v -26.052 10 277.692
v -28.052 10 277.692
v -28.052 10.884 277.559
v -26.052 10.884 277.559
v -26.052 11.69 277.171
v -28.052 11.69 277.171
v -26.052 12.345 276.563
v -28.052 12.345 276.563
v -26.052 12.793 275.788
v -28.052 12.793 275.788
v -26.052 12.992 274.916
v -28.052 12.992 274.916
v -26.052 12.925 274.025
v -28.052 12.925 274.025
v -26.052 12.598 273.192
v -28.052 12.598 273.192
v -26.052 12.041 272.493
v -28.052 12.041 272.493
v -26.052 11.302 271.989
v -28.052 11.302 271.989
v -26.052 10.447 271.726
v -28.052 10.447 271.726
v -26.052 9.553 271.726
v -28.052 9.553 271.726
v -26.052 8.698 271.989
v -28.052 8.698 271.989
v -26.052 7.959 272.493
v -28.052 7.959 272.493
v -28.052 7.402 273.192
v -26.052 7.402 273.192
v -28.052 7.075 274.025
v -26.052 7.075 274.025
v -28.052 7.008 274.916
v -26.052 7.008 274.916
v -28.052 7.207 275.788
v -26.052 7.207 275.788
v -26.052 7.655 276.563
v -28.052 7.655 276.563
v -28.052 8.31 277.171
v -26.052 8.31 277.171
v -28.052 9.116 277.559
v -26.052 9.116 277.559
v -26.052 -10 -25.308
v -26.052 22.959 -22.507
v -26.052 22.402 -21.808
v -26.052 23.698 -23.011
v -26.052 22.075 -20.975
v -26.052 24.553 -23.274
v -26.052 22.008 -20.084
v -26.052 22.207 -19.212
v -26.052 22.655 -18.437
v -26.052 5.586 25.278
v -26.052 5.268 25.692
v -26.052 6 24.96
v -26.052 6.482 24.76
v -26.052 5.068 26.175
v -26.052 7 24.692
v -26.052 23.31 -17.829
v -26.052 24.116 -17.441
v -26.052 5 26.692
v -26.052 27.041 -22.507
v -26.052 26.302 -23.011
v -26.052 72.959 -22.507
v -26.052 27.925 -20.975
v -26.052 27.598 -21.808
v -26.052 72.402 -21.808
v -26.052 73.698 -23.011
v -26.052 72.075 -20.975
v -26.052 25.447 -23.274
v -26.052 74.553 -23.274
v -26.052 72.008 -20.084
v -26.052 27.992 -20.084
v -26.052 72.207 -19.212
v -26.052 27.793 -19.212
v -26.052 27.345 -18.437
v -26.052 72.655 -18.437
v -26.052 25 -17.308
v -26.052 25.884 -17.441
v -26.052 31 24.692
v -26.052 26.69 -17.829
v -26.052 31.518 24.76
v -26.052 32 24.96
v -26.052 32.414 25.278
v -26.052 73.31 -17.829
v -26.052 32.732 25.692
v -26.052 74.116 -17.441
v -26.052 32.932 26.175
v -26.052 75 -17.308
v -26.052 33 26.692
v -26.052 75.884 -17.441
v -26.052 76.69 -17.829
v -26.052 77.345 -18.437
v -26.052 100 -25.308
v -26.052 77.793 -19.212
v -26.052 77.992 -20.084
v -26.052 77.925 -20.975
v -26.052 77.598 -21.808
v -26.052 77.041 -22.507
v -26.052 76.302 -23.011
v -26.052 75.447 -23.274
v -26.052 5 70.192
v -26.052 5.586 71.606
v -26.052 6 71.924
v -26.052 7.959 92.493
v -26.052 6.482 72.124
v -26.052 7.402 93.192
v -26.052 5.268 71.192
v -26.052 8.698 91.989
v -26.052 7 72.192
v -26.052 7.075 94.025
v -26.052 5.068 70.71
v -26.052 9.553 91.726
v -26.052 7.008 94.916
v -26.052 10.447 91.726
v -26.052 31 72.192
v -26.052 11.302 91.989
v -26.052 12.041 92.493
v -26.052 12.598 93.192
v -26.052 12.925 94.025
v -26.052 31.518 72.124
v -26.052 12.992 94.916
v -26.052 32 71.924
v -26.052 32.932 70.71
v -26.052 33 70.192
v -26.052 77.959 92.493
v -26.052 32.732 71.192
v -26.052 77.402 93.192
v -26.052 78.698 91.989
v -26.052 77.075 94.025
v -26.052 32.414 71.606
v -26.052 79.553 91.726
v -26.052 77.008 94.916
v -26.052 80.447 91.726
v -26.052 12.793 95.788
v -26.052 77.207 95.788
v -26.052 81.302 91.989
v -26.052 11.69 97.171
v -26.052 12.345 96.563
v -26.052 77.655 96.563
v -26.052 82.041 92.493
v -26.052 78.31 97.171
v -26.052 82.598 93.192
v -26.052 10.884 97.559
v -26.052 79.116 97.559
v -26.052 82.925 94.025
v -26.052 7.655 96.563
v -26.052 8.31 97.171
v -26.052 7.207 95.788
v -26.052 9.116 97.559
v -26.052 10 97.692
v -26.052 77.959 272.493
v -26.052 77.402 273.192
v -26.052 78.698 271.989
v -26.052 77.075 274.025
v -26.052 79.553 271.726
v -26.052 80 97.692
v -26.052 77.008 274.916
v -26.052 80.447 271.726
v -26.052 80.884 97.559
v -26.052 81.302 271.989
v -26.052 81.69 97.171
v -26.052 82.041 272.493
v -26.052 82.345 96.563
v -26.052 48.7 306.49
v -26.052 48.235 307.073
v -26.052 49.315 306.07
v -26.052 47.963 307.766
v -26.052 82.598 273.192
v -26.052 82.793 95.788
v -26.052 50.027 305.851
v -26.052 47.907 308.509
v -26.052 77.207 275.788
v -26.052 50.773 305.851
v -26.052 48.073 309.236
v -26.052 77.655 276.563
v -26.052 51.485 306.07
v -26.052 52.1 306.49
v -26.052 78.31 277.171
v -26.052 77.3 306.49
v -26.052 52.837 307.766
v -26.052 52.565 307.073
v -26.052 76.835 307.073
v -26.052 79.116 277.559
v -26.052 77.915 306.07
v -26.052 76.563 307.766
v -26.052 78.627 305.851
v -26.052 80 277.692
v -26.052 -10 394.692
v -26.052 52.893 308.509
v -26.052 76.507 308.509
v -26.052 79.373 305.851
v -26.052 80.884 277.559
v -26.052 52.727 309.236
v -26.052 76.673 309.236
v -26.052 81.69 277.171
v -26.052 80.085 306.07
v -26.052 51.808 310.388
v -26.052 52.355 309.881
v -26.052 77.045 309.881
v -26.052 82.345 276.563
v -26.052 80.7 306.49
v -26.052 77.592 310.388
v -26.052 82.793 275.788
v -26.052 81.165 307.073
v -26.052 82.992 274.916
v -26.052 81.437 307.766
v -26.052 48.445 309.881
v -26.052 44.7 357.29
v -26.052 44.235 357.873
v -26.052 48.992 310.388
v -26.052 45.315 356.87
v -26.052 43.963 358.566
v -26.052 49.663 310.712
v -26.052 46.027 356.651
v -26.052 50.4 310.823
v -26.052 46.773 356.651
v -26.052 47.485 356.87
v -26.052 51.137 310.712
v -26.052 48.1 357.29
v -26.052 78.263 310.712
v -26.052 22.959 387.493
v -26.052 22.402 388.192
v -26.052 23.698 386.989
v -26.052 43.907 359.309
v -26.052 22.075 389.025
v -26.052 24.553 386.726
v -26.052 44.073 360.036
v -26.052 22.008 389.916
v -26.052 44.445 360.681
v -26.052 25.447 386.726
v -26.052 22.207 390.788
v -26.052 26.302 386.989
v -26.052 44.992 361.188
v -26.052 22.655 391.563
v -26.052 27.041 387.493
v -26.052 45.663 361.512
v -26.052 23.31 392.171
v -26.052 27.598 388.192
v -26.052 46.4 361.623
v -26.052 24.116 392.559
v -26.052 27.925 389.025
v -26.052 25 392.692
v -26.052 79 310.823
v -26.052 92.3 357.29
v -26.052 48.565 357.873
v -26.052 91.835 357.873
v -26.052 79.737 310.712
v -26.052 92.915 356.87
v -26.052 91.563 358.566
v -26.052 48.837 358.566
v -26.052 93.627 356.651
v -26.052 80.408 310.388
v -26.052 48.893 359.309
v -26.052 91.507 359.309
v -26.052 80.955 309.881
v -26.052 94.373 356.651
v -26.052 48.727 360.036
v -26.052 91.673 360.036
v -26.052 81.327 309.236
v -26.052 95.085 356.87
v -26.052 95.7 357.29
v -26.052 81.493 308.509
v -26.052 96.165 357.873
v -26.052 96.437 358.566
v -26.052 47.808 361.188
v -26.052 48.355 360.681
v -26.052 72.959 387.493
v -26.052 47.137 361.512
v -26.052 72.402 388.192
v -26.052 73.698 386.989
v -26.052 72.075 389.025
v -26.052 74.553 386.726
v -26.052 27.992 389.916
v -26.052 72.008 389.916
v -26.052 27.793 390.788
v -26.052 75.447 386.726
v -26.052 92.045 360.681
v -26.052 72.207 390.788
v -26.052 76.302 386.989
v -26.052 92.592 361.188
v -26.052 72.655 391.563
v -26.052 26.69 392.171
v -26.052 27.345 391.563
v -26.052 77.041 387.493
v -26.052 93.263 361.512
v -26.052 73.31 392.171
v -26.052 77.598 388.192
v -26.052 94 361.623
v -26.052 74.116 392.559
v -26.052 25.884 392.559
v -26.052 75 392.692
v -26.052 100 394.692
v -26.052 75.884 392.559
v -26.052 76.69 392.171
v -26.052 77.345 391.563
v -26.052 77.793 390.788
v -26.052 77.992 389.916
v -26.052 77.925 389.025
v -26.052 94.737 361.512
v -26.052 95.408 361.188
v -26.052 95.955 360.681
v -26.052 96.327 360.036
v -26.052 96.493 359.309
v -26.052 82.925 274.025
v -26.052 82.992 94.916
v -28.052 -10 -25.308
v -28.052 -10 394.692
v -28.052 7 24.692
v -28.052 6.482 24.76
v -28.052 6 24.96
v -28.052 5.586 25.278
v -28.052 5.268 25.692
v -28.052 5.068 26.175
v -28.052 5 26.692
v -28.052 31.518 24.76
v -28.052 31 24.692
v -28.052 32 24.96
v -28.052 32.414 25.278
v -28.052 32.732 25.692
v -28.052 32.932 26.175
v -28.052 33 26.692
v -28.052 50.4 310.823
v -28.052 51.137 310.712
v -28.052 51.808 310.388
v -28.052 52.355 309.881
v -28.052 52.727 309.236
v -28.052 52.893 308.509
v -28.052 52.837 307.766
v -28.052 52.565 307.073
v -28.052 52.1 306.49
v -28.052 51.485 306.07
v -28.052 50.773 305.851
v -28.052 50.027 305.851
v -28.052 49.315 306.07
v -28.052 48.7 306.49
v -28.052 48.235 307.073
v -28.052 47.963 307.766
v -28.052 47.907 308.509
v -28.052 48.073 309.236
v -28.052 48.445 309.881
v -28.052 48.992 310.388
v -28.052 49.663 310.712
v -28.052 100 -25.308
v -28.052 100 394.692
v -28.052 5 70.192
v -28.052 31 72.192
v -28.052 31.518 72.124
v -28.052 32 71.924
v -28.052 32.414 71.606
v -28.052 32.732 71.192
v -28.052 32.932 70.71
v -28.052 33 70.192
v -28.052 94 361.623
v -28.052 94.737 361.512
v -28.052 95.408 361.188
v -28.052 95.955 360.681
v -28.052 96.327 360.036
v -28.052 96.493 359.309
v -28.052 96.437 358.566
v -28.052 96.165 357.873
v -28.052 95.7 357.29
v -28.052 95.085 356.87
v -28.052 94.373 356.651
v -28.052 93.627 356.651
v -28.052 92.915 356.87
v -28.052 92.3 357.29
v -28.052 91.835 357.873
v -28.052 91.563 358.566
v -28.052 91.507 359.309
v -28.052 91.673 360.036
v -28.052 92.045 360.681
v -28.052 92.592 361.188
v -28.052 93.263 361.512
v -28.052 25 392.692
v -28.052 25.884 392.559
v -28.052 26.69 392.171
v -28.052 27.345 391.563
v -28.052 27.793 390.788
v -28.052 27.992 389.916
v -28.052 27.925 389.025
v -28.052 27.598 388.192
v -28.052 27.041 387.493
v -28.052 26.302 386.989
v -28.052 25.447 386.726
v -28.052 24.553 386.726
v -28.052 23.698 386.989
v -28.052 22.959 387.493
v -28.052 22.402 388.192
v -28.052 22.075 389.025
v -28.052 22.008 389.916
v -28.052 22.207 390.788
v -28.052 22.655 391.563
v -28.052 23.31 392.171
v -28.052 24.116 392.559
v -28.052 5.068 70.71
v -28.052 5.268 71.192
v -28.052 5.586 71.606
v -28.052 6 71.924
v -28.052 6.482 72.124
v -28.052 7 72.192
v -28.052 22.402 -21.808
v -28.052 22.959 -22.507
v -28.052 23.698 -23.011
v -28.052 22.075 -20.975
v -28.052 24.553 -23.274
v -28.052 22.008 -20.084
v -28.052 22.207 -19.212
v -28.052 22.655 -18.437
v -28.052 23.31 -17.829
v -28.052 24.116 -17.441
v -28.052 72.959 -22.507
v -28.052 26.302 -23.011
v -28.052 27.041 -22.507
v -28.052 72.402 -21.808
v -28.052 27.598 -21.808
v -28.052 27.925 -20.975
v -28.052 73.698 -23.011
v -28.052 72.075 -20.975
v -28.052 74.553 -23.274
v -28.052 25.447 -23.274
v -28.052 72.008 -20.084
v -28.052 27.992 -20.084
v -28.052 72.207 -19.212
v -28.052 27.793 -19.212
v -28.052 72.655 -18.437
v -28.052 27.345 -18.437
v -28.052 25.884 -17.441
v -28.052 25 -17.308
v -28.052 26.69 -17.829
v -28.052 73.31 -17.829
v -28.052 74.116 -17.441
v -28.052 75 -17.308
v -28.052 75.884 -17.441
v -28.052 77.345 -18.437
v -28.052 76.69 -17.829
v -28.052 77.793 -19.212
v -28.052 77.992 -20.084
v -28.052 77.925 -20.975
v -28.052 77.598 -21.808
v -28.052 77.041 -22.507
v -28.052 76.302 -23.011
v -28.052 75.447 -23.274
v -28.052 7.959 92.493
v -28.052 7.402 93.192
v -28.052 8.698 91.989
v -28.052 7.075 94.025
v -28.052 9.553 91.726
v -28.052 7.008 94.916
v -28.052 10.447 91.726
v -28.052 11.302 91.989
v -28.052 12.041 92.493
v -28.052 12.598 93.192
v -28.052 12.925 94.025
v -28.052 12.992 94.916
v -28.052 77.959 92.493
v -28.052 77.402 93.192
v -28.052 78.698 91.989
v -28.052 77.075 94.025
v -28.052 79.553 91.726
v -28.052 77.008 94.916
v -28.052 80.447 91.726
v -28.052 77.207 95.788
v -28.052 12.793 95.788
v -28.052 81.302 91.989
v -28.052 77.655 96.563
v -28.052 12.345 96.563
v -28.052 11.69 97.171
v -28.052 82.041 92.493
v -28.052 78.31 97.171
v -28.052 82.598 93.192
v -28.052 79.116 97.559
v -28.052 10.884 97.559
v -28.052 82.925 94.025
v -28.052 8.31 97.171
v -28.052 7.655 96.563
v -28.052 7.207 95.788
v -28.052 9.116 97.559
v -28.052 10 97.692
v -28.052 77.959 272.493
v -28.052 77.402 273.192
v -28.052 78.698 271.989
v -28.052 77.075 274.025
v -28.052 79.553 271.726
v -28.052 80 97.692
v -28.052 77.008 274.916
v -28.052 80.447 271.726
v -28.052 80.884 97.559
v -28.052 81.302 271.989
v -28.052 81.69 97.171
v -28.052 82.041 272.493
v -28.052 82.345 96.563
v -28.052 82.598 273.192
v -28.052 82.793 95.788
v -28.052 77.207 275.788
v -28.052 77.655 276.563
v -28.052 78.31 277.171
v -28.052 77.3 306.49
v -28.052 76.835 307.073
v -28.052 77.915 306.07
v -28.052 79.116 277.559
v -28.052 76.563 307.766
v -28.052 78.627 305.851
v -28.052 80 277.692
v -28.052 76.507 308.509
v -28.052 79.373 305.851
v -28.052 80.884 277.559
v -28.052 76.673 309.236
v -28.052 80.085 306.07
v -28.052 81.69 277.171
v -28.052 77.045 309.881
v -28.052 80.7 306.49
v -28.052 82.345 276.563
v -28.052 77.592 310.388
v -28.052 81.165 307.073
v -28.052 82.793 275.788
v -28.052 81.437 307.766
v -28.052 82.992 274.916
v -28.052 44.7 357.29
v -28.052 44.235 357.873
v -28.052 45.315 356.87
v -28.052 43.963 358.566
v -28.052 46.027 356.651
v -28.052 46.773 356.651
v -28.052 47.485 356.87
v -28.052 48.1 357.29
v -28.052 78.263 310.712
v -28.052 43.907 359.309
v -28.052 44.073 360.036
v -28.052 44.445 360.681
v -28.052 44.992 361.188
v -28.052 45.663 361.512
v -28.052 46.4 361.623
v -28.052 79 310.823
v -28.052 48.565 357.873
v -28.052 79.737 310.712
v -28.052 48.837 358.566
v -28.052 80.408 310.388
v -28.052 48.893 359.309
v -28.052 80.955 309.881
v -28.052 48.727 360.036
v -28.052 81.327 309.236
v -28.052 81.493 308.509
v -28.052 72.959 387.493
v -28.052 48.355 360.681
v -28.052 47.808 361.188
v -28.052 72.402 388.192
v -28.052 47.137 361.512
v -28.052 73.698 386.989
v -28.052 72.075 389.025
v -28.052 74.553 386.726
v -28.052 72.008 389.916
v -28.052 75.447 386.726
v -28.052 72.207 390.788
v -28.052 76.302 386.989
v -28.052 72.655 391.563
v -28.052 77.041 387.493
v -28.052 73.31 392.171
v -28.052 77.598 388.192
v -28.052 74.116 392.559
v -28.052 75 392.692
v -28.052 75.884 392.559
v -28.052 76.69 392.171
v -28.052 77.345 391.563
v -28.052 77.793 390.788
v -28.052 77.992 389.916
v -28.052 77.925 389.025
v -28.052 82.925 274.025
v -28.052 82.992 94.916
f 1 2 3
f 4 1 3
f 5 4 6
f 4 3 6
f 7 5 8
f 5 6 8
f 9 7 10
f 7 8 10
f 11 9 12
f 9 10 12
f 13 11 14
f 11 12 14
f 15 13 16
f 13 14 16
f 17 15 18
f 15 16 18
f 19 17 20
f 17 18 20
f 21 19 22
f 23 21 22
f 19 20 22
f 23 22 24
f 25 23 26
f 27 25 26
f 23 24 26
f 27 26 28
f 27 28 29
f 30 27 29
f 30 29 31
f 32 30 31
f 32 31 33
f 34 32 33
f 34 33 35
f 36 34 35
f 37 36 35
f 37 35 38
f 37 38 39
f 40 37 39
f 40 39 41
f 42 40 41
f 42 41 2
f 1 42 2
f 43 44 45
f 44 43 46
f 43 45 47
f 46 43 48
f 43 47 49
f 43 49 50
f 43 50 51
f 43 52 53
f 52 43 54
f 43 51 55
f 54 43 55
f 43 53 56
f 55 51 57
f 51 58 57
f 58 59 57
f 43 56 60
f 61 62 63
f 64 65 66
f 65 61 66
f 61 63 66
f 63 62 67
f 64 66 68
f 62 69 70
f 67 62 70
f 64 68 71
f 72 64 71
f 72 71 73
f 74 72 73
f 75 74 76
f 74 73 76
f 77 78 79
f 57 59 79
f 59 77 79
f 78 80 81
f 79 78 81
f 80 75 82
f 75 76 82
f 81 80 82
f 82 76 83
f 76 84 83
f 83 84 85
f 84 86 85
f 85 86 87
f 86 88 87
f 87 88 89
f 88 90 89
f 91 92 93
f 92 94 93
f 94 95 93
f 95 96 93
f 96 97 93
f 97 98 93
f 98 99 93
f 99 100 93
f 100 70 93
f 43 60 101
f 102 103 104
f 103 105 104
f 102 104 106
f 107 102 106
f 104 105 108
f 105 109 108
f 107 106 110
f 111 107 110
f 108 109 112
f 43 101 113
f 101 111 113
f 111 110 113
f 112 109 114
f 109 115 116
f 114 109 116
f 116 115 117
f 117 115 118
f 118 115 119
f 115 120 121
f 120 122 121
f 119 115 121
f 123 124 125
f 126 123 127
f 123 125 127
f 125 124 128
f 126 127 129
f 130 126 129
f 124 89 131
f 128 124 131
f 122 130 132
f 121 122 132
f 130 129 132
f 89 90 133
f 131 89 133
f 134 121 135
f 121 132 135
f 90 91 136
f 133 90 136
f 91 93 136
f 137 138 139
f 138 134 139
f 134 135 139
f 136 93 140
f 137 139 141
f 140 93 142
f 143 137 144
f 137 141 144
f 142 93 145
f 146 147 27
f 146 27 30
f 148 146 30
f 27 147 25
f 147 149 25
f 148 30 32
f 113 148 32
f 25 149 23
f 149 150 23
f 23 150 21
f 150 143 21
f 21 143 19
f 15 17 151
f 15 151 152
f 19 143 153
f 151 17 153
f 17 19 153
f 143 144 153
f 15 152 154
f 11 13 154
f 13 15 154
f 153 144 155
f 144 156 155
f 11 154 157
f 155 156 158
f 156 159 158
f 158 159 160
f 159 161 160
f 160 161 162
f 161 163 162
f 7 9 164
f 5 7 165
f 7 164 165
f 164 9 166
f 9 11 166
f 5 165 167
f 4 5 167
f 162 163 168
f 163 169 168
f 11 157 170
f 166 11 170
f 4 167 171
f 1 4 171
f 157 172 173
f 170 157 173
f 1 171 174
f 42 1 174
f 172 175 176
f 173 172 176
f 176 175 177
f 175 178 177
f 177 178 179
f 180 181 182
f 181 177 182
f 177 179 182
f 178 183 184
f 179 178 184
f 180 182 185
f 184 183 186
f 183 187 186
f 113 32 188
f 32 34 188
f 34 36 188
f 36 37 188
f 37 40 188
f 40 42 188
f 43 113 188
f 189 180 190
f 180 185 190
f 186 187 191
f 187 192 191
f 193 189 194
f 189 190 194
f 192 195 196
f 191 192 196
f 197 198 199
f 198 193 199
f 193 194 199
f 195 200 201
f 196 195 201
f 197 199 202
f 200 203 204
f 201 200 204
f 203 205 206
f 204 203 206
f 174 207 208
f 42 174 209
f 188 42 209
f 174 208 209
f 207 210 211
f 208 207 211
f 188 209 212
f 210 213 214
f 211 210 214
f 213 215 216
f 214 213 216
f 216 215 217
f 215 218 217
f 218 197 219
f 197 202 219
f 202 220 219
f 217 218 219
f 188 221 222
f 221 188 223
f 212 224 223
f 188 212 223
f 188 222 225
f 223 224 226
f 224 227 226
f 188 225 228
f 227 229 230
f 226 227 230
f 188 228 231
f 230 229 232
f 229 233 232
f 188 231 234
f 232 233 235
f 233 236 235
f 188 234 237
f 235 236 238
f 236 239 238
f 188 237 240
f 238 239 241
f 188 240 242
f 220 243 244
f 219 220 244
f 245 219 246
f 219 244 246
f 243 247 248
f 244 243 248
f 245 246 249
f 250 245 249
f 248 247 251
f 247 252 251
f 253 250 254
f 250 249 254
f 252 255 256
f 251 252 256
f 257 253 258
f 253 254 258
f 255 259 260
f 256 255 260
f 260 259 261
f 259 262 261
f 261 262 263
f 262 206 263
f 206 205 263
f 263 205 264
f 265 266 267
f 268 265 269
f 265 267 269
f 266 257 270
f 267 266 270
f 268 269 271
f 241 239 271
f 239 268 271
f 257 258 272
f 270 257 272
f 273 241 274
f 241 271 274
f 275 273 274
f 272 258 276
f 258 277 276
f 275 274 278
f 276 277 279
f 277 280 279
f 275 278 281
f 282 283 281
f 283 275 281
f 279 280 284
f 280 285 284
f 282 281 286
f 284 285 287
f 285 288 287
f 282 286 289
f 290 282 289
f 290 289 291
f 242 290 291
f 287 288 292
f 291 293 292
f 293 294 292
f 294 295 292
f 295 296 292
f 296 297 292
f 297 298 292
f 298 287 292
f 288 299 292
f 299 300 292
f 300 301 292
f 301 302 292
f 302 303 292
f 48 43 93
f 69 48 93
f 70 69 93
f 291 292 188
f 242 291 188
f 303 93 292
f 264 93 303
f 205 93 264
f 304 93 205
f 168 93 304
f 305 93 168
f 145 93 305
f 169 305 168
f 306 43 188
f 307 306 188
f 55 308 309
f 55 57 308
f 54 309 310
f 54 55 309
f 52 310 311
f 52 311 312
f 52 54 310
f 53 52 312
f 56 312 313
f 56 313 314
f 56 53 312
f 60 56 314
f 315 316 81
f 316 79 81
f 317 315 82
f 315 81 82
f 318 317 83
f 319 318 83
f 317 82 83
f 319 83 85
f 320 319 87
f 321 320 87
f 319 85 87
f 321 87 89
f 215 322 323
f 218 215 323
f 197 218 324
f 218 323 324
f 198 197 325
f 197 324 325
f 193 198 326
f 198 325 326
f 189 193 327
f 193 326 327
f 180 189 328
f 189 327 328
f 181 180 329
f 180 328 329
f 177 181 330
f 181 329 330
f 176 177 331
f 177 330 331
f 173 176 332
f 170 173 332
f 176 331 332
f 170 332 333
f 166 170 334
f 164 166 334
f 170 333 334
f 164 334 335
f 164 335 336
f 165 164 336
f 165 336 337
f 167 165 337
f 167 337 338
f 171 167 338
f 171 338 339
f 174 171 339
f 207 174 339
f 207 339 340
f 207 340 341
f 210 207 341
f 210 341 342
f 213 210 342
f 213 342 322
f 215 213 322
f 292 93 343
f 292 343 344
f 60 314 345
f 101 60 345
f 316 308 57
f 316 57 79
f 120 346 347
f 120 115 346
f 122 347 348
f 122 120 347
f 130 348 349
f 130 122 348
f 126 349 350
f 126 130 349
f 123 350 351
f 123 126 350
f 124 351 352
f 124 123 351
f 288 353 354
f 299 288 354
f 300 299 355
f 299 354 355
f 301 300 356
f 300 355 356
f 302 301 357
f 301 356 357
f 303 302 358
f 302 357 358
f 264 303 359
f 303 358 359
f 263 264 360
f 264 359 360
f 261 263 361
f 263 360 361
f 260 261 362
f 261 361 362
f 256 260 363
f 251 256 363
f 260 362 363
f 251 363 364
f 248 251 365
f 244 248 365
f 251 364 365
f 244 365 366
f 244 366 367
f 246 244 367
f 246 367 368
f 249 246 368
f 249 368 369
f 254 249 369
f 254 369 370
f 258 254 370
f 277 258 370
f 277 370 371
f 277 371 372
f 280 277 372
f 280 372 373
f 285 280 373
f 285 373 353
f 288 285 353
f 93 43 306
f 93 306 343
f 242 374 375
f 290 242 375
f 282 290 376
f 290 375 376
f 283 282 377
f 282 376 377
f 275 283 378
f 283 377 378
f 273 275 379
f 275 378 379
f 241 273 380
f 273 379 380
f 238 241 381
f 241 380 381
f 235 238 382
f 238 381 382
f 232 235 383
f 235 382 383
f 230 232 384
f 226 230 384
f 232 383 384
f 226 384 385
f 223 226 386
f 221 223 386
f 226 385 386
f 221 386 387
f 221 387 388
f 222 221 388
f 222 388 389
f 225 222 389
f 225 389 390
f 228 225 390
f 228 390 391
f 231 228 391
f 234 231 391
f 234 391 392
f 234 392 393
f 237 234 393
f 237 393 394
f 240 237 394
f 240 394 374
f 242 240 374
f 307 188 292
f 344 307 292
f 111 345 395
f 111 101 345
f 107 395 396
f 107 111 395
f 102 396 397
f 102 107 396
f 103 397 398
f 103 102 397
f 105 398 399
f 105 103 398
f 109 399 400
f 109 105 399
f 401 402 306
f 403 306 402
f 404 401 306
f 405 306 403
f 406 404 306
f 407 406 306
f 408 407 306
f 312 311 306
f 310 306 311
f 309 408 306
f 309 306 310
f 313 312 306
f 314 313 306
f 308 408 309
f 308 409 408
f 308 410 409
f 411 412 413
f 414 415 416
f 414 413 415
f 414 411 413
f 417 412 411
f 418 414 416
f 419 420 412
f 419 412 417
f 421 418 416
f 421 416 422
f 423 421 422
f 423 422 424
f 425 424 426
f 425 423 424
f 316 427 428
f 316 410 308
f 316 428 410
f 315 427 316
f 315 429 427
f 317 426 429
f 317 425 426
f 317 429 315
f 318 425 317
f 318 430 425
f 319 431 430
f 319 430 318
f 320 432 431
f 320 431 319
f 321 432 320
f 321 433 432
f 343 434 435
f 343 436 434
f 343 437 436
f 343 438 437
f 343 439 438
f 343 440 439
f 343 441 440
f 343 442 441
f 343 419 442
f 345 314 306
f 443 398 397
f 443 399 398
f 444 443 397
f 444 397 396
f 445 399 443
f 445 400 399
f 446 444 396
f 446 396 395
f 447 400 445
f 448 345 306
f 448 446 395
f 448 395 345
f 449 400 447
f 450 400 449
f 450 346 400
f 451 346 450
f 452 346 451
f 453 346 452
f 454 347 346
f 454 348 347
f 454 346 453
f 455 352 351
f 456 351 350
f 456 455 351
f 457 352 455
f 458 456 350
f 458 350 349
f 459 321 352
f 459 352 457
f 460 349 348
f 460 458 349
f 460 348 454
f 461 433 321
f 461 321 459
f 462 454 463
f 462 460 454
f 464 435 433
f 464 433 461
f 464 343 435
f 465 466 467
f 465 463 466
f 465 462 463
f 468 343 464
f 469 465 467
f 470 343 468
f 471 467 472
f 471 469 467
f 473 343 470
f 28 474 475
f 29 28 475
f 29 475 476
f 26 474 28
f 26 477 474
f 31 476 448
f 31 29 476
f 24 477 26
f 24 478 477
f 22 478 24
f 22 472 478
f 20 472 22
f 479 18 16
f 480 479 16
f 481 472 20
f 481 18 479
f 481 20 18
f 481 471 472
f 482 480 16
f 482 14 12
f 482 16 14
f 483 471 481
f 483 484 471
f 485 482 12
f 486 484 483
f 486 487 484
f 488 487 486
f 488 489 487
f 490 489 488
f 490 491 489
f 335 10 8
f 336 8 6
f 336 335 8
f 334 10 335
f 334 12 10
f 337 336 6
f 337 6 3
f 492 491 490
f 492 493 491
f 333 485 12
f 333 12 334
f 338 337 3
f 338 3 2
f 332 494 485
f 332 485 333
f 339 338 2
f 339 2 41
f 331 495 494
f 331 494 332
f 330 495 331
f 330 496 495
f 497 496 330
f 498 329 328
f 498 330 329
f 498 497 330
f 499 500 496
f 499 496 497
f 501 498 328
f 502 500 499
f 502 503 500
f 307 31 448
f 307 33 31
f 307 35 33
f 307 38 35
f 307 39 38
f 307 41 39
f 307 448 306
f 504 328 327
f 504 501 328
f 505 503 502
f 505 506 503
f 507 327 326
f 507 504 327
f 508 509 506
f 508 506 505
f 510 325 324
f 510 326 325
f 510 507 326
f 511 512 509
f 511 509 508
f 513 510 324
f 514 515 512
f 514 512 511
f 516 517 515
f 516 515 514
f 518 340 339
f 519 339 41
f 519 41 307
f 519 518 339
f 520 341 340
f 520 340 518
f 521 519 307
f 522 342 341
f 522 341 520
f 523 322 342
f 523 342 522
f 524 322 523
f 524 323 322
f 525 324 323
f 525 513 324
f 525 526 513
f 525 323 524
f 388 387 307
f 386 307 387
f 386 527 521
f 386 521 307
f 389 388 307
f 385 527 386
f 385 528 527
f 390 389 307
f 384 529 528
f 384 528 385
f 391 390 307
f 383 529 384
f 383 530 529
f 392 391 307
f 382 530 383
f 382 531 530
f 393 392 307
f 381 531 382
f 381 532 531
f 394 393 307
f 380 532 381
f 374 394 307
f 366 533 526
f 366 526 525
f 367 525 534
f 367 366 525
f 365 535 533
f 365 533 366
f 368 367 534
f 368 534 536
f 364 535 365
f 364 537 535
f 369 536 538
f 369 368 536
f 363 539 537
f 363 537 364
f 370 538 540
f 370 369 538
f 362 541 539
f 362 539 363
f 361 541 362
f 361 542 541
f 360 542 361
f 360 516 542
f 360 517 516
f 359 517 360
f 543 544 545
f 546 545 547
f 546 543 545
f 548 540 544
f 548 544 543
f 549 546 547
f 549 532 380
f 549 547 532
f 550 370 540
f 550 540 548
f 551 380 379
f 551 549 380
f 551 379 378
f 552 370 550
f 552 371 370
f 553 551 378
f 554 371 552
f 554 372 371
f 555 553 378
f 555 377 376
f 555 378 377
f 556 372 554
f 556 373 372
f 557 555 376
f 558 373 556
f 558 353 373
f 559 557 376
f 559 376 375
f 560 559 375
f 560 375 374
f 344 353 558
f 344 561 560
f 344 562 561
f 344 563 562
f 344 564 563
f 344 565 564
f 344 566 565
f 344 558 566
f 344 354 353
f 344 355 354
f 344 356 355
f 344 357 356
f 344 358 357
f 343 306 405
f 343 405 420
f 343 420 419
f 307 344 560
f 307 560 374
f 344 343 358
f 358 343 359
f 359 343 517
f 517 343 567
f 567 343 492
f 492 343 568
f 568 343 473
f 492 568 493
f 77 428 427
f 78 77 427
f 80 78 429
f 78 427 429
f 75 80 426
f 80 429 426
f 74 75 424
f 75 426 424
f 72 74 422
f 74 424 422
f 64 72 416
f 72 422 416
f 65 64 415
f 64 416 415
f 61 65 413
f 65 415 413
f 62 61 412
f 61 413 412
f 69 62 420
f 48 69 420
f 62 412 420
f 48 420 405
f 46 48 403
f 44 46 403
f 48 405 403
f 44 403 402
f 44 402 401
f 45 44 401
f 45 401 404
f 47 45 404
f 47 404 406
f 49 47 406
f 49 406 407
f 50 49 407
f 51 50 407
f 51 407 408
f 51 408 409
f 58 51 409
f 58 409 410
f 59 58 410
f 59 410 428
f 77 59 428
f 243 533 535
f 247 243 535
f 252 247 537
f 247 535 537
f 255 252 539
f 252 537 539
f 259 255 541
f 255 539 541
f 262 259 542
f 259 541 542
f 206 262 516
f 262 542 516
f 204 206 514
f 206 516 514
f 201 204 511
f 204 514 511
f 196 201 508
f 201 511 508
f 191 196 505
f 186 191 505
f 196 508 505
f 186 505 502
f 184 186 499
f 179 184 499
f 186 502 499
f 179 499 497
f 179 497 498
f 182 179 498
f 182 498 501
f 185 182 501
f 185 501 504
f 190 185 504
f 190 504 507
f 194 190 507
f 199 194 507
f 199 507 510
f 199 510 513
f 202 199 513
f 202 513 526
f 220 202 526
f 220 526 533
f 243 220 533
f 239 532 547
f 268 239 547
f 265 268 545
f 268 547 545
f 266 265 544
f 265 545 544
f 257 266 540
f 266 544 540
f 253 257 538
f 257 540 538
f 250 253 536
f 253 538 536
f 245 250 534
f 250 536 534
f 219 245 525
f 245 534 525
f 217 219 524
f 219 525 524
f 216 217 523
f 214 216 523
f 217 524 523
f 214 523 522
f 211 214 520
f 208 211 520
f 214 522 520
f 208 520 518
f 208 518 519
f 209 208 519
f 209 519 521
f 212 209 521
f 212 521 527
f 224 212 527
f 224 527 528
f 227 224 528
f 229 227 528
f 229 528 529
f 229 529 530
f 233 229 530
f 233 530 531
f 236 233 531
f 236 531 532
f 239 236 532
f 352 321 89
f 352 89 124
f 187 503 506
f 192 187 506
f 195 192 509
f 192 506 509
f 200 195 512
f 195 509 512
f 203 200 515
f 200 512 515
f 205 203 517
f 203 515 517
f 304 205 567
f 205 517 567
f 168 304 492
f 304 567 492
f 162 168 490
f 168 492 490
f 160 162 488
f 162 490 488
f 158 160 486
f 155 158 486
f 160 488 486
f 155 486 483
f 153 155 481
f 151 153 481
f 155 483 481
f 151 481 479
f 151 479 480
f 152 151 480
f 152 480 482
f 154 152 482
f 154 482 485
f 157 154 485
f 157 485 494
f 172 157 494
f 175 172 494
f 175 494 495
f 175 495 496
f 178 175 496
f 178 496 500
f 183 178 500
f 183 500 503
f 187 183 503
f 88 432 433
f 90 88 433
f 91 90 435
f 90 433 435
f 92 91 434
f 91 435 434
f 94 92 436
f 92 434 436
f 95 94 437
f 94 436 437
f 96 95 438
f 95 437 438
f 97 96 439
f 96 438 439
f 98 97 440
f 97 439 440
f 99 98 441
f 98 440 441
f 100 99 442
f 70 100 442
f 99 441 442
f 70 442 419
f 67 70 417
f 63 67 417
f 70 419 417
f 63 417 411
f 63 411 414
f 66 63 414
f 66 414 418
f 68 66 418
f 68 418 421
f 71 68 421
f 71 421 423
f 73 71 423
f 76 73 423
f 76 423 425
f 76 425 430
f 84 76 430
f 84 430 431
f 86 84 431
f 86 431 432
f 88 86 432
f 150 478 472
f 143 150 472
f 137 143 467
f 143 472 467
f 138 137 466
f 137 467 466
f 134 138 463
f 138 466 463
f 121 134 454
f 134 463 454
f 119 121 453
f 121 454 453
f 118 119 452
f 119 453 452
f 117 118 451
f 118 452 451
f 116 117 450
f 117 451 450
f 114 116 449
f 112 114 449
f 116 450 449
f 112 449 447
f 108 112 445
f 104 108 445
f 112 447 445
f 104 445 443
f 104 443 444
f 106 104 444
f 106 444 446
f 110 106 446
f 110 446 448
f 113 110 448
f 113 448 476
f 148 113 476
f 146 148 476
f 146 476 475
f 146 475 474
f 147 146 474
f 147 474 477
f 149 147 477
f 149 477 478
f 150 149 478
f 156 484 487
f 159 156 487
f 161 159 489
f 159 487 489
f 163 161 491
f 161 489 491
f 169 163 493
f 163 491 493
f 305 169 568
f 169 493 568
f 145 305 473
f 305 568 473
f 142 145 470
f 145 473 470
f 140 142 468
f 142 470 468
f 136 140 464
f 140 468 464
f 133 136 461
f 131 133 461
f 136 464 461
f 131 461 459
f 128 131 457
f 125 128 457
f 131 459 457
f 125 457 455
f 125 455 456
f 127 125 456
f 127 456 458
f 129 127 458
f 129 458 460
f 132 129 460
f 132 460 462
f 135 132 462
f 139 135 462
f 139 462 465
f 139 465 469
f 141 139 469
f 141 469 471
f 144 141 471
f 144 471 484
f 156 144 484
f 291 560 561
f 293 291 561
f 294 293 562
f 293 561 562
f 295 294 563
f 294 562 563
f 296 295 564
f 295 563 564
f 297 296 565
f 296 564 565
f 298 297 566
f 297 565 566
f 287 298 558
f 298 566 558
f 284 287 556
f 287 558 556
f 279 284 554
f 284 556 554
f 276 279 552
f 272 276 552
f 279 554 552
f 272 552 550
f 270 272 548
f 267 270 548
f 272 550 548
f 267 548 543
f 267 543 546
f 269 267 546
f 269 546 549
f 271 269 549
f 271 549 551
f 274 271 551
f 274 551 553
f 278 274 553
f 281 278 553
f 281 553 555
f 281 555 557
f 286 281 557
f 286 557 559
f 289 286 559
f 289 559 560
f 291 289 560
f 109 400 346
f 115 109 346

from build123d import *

# Parameters (mm, degrees)
SKETCH1_W           = 420
SKETCH1_H           = 110
BOSS_EXTRUDE1_DEPTH = 2
CUT_EXTRUDE1_REACH  = 4
SKETCH2_R           = 3
CUT_EXTRUDE2_REACH  = 4
SKETCH3_R           = 3
SKETCH3_R_2         = 2.5
SKETCH3_W           = 47.5
SKETCH3_H           = 28
FILLET1_R           = 2


with BuildPart() as part:
    # Sketch1 → Boss-Extrude1 (new body)
    with BuildSketch(Plane.ZY.offset(26.051745534)):
        with Locations((184.692172039, 45)):
            Rectangle(SKETCH1_W, SKETCH1_H)
    extrude(amount=BOSS_EXTRUDE1_DEPTH)

    # Sketch2 → Cut-Extrude1 (cut, up to next)
    with BuildSketch(Plane.ZY.offset(28.051745534), mode=Mode.PRIVATE) as cut_extrude1_sk1:
        with Locations((-20.307827961, 75)):
            Circle(SKETCH2_R)
    cut_extrude1_tool1 = extrude(cut_extrude1_sk1.sketch, amount=-CUT_EXTRUDE1_REACH, mode=Mode.PRIVATE) & part.part
    add(cut_extrude1_tool1.solids().sort_by_distance((-28.051746, 75, -20.307828))[0], mode=Mode.SUBTRACT)
    # Sketch2 → Cut-Extrude1 (cut, up to next)
    with BuildSketch(Plane.ZY.offset(28.051745534), mode=Mode.PRIVATE) as cut_extrude1_sk2:
        with Locations((-20.307827961, 25)):
            Circle(SKETCH2_R)
    cut_extrude1_tool2 = extrude(cut_extrude1_sk2.sketch, amount=-CUT_EXTRUDE1_REACH, mode=Mode.PRIVATE) & part.part
    add(cut_extrude1_tool2.solids().sort_by_distance((-28.051746, 25, -20.307828))[0], mode=Mode.SUBTRACT)
    # Sketch2 → Cut-Extrude1 (cut, up to next)
    with BuildSketch(Plane.ZY.offset(28.051745534), mode=Mode.PRIVATE) as cut_extrude1_sk3:
        with Locations((389.692172039, 75)):
            Circle(SKETCH2_R)
    cut_extrude1_tool3 = extrude(cut_extrude1_sk3.sketch, amount=-CUT_EXTRUDE1_REACH, mode=Mode.PRIVATE) & part.part
    add(cut_extrude1_tool3.solids().sort_by_distance((-28.051746, 75, 389.692172))[0], mode=Mode.SUBTRACT)
    # Sketch2 → Cut-Extrude1 (cut, up to next)
    with BuildSketch(Plane.ZY.offset(28.051745534), mode=Mode.PRIVATE) as cut_extrude1_sk4:
        with Locations((389.692172039, 25)):
            Circle(SKETCH2_R)
    cut_extrude1_tool4 = extrude(cut_extrude1_sk4.sketch, amount=-CUT_EXTRUDE1_REACH, mode=Mode.PRIVATE) & part.part
    add(cut_extrude1_tool4.solids().sort_by_distance((-28.051746, 25, 389.692172))[0], mode=Mode.SUBTRACT)

    # Sketch3 → Cut-Extrude2 (cut, up to next)
    with BuildSketch(Plane.ZY.offset(28.051745534), mode=Mode.PRIVATE) as cut_extrude2_sk1:
        with Locations((94.692172039, 10)):
            Circle(SKETCH3_R)
    cut_extrude2_tool1 = extrude(cut_extrude2_sk1.sketch, amount=-CUT_EXTRUDE2_REACH, mode=Mode.PRIVATE) & part.part
    add(cut_extrude2_tool1.solids().sort_by_distance((-28.051746, 10, 94.692172))[0], mode=Mode.SUBTRACT)
    # Sketch3 → Cut-Extrude2 (cut, up to next)
    with BuildSketch(Plane.ZY.offset(28.051745534), mode=Mode.PRIVATE) as cut_extrude2_sk2:
        with Locations((274.692172039, 10)):
            Circle(SKETCH3_R)
    cut_extrude2_tool2 = extrude(cut_extrude2_sk2.sketch, amount=-CUT_EXTRUDE2_REACH, mode=Mode.PRIVATE) & part.part
    add(cut_extrude2_tool2.solids().sort_by_distance((-28.051746, 10, 274.692172))[0], mode=Mode.SUBTRACT)
    # Sketch3 → Cut-Extrude2 (cut, up to next)
    with BuildSketch(Plane.ZY.offset(28.051745534), mode=Mode.PRIVATE) as cut_extrude2_sk3:
        with Locations((94.692172039, 80)):
            Circle(SKETCH3_R)
    cut_extrude2_tool3 = extrude(cut_extrude2_sk3.sketch, amount=-CUT_EXTRUDE2_REACH, mode=Mode.PRIVATE) & part.part
    add(cut_extrude2_tool3.solids().sort_by_distance((-28.051746, 80, 94.692172))[0], mode=Mode.SUBTRACT)
    # Sketch3 → Cut-Extrude2 (cut, up to next)
    with BuildSketch(Plane.ZY.offset(28.051745534), mode=Mode.PRIVATE) as cut_extrude2_sk4:
        with Locations((274.692172039, 80)):
            Circle(SKETCH3_R)
    cut_extrude2_tool4 = extrude(cut_extrude2_sk4.sketch, amount=-CUT_EXTRUDE2_REACH, mode=Mode.PRIVATE) & part.part
    add(cut_extrude2_tool4.solids().sort_by_distance((-28.051746, 80, 274.692172))[0], mode=Mode.SUBTRACT)
    # Sketch3 → Cut-Extrude2 (cut, up to next)
    with BuildSketch(Plane.ZY.offset(28.051745534), mode=Mode.PRIVATE) as cut_extrude2_sk5:
        with Locations((359.1226293, 94)):
            Circle(SKETCH3_R_2)
    cut_extrude2_tool5 = extrude(cut_extrude2_sk5.sketch, amount=-CUT_EXTRUDE2_REACH, mode=Mode.PRIVATE) & part.part
    add(cut_extrude2_tool5.solids().sort_by_distance((-28.051746, 94, 359.122629))[0], mode=Mode.SUBTRACT)
    # Sketch3 → Cut-Extrude2 (cut, up to next)
    with BuildSketch(Plane.ZY.offset(28.051745534), mode=Mode.PRIVATE) as cut_extrude2_sk6:
        with Locations((308.3226293, 79)):
            Circle(SKETCH3_R_2)
    cut_extrude2_tool6 = extrude(cut_extrude2_sk6.sketch, amount=-CUT_EXTRUDE2_REACH, mode=Mode.PRIVATE) & part.part
    add(cut_extrude2_tool6.solids().sort_by_distance((-28.051746, 79, 308.322629))[0], mode=Mode.SUBTRACT)
    # Sketch3 → Cut-Extrude2 (cut, up to next)
    with BuildSketch(Plane.ZY.offset(28.051745534), mode=Mode.PRIVATE) as cut_extrude2_sk7:
        with Locations((308.3226293, 50.4)):
            Circle(SKETCH3_R_2)
    cut_extrude2_tool7 = extrude(cut_extrude2_sk7.sketch, amount=-CUT_EXTRUDE2_REACH, mode=Mode.PRIVATE) & part.part
    add(cut_extrude2_tool7.solids().sort_by_distance((-28.051746, 50.4, 308.322629))[0], mode=Mode.SUBTRACT)
    # Sketch3 → Cut-Extrude2 (cut, up to next)
    with BuildSketch(Plane.ZY.offset(28.051745534), mode=Mode.PRIVATE) as cut_extrude2_sk8:
        with Locations((359.1226293, 46.4)):
            Circle(SKETCH3_R_2)
    cut_extrude2_tool8 = extrude(cut_extrude2_sk8.sketch, amount=-CUT_EXTRUDE2_REACH, mode=Mode.PRIVATE) & part.part
    add(cut_extrude2_tool8.solids().sort_by_distance((-28.051746, 46.4, 359.122629))[0], mode=Mode.SUBTRACT)
    # Sketch3 → Cut-Extrude2 (cut, up to next)
    with BuildSketch(Plane.ZY.offset(28.051745534), mode=Mode.PRIVATE) as cut_extrude2_sk9:
        with Locations((48.442172039, 19)):
            Rectangle(SKETCH3_W, SKETCH3_H)
    cut_extrude2_tool9 = extrude(cut_extrude2_sk9.sketch, amount=-CUT_EXTRUDE2_REACH, mode=Mode.PRIVATE) & part.part
    add(cut_extrude2_tool9.solids().sort_by_distance((-28.051746, 19, 48.442172))[0], mode=Mode.SUBTRACT)

    # Fillet1
    fillet1_edges = [part.edges().sort_by_distance(p)[0] for p in [
        (-27.051745534, 5, 24.692172039),
        (-27.051745534, 33, 24.692172039),
        (-27.051745534, 33, 72.192172039),
        (-27.051745534, 5, 72.192172039),
    ]]
    fillet(fillet1_edges, radius=FILLET1_R)


solid = part.part
